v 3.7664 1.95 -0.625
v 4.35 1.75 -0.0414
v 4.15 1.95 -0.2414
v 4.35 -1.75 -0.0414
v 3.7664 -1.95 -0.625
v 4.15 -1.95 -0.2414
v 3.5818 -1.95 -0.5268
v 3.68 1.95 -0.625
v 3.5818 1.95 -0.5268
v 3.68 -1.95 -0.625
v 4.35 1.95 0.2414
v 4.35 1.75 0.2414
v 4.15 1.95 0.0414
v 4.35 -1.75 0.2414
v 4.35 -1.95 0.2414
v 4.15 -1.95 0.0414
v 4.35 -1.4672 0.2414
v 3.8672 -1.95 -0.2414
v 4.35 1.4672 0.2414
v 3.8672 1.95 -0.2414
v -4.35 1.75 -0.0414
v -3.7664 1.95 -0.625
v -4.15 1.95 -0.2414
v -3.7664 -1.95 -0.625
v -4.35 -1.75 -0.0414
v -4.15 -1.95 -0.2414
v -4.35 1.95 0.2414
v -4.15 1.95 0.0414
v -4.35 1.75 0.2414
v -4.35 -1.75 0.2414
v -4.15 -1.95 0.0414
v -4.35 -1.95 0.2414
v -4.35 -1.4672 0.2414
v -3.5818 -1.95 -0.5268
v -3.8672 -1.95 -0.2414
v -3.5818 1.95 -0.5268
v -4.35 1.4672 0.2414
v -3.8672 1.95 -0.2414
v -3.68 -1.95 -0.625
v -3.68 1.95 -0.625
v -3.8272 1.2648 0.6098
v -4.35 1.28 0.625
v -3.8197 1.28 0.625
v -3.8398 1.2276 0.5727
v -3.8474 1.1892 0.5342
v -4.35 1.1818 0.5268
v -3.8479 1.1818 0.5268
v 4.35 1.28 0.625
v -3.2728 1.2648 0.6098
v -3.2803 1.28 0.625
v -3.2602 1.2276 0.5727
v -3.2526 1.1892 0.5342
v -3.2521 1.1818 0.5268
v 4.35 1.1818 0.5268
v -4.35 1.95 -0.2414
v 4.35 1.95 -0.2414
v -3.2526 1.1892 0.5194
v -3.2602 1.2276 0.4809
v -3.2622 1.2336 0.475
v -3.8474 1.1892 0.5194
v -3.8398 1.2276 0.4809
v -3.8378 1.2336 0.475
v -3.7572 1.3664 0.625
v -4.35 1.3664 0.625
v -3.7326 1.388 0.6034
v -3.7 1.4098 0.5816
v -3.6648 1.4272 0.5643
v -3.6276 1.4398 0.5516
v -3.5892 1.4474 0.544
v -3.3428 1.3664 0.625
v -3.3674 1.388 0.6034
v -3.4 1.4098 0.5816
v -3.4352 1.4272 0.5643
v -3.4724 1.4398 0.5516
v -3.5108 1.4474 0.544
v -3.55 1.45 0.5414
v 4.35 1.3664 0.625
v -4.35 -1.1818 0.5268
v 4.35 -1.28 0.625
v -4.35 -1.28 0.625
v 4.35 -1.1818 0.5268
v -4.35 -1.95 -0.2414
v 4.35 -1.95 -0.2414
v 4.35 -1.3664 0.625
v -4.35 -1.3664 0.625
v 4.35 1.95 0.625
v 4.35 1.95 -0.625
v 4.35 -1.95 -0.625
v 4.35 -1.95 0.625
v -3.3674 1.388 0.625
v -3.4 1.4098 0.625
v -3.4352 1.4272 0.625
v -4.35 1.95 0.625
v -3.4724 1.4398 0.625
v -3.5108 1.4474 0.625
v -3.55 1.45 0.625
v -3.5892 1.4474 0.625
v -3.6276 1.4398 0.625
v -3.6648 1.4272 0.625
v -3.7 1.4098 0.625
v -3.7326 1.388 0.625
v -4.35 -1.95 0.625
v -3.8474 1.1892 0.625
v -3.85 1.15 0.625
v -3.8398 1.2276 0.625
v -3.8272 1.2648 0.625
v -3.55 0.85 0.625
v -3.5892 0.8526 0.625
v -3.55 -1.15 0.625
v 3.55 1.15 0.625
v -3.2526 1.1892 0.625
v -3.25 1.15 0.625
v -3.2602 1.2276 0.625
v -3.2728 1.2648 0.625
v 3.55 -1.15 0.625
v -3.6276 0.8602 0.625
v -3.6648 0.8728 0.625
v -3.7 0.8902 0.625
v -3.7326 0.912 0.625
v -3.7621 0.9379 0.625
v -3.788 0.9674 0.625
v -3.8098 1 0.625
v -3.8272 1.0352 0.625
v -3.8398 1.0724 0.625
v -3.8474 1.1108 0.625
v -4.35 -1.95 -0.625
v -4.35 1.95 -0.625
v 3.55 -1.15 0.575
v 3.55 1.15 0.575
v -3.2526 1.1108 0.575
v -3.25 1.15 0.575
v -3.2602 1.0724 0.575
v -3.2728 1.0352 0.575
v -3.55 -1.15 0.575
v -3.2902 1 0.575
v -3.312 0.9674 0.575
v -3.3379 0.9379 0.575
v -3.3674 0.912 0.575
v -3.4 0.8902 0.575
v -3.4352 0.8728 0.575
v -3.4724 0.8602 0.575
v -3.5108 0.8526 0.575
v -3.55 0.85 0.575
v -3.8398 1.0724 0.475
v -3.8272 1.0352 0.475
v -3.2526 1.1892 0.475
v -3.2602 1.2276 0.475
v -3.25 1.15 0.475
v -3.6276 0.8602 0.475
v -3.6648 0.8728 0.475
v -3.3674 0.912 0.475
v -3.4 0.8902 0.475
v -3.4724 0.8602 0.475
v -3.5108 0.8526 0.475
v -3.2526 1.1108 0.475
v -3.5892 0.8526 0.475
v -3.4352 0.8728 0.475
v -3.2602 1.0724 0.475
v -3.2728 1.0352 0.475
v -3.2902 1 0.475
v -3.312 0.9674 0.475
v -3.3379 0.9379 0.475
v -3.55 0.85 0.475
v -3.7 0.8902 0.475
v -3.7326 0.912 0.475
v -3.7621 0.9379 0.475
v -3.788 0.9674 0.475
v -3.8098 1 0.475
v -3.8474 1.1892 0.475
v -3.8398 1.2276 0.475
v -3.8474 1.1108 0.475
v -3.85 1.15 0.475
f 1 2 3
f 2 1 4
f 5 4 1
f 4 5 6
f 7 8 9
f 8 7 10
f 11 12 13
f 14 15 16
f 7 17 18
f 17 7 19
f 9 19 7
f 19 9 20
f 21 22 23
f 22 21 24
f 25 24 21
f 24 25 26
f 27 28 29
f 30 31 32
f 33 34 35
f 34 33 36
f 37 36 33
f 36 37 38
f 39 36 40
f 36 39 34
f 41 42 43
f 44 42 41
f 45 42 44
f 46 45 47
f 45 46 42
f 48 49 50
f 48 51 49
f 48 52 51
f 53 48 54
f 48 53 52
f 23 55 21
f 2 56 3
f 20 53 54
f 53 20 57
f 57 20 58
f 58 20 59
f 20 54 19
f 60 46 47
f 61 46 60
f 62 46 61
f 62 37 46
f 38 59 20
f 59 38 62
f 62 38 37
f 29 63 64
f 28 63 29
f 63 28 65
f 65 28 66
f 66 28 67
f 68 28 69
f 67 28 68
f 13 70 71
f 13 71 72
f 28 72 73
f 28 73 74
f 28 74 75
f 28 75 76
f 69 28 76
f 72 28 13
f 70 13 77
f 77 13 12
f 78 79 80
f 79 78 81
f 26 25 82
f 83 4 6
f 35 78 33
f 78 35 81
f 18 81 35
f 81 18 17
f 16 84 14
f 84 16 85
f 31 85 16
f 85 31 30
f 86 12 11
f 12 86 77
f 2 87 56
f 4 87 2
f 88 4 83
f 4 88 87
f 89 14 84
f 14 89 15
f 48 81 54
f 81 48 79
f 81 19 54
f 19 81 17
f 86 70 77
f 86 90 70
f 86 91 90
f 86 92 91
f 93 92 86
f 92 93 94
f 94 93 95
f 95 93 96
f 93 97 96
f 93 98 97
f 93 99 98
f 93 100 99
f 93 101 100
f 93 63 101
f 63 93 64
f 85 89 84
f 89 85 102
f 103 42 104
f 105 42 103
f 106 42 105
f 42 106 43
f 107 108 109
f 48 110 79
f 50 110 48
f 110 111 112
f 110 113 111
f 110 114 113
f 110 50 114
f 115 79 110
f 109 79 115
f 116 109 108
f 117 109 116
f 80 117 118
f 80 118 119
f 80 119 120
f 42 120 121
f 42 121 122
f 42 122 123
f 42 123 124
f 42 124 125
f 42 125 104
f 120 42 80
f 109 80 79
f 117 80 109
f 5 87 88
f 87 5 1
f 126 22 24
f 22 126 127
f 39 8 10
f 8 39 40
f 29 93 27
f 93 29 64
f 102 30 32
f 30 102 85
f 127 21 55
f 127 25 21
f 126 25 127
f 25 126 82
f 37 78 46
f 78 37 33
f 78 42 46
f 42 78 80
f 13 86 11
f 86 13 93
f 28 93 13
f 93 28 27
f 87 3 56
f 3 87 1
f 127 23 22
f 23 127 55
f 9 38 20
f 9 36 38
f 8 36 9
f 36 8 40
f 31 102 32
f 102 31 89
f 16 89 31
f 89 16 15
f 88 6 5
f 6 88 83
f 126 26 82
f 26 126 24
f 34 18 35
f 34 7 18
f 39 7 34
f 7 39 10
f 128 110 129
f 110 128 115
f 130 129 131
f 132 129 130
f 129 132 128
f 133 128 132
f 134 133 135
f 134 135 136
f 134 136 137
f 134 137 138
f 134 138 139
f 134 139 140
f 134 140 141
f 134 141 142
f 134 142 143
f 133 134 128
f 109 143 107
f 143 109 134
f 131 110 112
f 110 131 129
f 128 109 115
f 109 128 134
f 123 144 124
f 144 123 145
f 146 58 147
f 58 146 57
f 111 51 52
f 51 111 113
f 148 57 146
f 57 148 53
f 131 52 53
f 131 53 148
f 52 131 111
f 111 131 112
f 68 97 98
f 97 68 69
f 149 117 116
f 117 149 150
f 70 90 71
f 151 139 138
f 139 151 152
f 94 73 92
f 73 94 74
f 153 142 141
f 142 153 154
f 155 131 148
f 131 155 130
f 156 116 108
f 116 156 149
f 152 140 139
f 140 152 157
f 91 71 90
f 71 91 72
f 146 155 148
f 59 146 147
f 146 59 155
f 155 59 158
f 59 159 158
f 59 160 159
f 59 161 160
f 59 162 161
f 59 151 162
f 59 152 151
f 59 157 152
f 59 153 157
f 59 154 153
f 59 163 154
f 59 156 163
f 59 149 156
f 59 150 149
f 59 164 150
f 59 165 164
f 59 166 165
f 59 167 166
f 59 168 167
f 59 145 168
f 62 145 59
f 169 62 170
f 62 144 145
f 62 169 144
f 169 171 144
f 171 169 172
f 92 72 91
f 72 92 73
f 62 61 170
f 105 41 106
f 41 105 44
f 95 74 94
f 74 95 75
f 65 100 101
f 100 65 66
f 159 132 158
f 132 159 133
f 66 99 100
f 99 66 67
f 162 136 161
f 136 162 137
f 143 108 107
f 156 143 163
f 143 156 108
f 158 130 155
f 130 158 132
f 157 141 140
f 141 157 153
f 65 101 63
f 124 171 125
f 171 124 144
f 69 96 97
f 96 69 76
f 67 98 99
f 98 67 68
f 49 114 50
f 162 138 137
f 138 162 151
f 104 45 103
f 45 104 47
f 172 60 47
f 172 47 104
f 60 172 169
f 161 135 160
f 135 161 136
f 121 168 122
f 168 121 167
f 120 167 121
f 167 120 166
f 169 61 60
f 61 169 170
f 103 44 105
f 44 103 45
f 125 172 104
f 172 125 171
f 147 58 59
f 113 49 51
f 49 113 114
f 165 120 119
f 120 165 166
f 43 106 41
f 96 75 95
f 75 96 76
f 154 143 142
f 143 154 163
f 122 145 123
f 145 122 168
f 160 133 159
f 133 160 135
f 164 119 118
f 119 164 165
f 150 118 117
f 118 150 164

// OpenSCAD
// SMD body target envelope: 8.70 x 3.90 x 1.25 (L x W x H)

$fn = 48;

// Parameters
body_length = 8.70;   // X
body_width  = 3.90;   // Y
body_height = 1.25;   // Z

// Edge treatment (kept small so overall envelope remains the same)
chamfer = 0.20;       // visual edge break (must be < min dimension/2)

// Marking / pin1 (engraved, does not change outer envelope)
pin1_diameter  = 0.60;
pin1_depth     = 0.15;
marking_depth  = 0.05;
marking_margin = 0.80;

// Robust boolean overlap (small, avoids "blank" due to coplanar subtraction)
eps = 0.02;

// Base body
module smd_body() {
    cube([body_length, body_width, body_height], center=true);
}

// Chamfer cutters: remove small wedges from the 4 vertical edges
module chamfer_cutters() {
    // Make cutters long/tall enough to fully intersect the body
    cutter_y = body_width  + 2*chamfer + 2*eps;
    cutter_x = body_length + 2*chamfer + 2*eps;
    cutter_z = body_height + 2*chamfer + 2*eps;

    union() {
        // X+ edge
        translate([ body_length/2 - chamfer/2, 0, 0])
            rotate([0, 45, 0])
                cube([chamfer, cutter_y, cutter_z], center=true);

        // X- edge
        translate([-body_length/2 + chamfer/2, 0, 0])
            rotate([0,-45, 0])
                cube([chamfer, cutter_y, cutter_z], center=true);

        // Y+ edge
        translate([0, body_width/2 - chamfer/2, 0])
            rotate([45, 0, 0])
                cube([cutter_x, chamfer, cutter_z], center=true);

        // Y- edge
        translate([0,-body_width/2 + chamfer/2, 0])
            rotate([-45, 0, 0])
                cube([cutter_x, chamfer, cutter_z], center=true);
    }
}

// Top marking recess (engraved)
module top_marking_cut() {
    marking_l = max(0.01, body_length - 2*marking_margin);
    marking_w = max(0.01, body_width  - 2*marking_margin);

    translate([0, 0, body_height/2 - marking_depth/2 + eps/2])
        cube([marking_l, marking_w, marking_depth + eps], center=true);
}

// Pin1 indicator recess (engraved)
module pin1_indicator_cut() {
    translate([
        -body_length/2 + marking_margin,
         body_width/2  - marking_margin,
         body_height/2 - pin1_depth/2 + eps/2
    ])
        cylinder(h=pin1_depth + eps, r=pin1_diameter/2, center=true);
}

// Final connected solid
difference() {
    // Outer envelope exactly matches target dimensions
    smd_body();

    // Subtractions only (do not add external bars/features)
    chamfer_cutters();
    top_marking_cut();
    pin1_indicator_cut();
}
